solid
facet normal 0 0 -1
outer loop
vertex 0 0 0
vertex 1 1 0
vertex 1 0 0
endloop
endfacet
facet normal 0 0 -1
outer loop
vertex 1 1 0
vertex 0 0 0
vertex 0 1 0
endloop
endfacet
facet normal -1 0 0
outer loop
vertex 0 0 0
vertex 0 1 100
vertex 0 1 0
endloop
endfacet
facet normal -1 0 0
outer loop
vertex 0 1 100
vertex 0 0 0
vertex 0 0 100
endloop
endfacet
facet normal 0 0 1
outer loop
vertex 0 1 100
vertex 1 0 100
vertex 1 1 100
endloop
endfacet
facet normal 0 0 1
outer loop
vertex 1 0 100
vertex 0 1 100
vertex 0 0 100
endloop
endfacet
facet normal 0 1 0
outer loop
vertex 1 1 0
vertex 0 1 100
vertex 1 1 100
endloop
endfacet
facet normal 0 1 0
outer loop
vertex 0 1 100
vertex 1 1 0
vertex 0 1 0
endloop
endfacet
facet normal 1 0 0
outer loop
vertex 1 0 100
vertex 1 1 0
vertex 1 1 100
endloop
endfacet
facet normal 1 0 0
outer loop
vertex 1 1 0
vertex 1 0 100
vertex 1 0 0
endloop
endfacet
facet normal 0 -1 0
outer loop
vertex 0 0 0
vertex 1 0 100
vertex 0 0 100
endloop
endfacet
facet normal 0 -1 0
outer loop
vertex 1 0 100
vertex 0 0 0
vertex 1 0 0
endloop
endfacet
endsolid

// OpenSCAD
linear_extrude(v = [0, 1, 1]) square();
linear_extrude(height = 2, v = [0, 0, 2]) square();
linear_extrude(height = 2, v = [1, 0, 1]) square();
linear_extrude(5, segments = 3) square();
linear_extrude(-1) square();
